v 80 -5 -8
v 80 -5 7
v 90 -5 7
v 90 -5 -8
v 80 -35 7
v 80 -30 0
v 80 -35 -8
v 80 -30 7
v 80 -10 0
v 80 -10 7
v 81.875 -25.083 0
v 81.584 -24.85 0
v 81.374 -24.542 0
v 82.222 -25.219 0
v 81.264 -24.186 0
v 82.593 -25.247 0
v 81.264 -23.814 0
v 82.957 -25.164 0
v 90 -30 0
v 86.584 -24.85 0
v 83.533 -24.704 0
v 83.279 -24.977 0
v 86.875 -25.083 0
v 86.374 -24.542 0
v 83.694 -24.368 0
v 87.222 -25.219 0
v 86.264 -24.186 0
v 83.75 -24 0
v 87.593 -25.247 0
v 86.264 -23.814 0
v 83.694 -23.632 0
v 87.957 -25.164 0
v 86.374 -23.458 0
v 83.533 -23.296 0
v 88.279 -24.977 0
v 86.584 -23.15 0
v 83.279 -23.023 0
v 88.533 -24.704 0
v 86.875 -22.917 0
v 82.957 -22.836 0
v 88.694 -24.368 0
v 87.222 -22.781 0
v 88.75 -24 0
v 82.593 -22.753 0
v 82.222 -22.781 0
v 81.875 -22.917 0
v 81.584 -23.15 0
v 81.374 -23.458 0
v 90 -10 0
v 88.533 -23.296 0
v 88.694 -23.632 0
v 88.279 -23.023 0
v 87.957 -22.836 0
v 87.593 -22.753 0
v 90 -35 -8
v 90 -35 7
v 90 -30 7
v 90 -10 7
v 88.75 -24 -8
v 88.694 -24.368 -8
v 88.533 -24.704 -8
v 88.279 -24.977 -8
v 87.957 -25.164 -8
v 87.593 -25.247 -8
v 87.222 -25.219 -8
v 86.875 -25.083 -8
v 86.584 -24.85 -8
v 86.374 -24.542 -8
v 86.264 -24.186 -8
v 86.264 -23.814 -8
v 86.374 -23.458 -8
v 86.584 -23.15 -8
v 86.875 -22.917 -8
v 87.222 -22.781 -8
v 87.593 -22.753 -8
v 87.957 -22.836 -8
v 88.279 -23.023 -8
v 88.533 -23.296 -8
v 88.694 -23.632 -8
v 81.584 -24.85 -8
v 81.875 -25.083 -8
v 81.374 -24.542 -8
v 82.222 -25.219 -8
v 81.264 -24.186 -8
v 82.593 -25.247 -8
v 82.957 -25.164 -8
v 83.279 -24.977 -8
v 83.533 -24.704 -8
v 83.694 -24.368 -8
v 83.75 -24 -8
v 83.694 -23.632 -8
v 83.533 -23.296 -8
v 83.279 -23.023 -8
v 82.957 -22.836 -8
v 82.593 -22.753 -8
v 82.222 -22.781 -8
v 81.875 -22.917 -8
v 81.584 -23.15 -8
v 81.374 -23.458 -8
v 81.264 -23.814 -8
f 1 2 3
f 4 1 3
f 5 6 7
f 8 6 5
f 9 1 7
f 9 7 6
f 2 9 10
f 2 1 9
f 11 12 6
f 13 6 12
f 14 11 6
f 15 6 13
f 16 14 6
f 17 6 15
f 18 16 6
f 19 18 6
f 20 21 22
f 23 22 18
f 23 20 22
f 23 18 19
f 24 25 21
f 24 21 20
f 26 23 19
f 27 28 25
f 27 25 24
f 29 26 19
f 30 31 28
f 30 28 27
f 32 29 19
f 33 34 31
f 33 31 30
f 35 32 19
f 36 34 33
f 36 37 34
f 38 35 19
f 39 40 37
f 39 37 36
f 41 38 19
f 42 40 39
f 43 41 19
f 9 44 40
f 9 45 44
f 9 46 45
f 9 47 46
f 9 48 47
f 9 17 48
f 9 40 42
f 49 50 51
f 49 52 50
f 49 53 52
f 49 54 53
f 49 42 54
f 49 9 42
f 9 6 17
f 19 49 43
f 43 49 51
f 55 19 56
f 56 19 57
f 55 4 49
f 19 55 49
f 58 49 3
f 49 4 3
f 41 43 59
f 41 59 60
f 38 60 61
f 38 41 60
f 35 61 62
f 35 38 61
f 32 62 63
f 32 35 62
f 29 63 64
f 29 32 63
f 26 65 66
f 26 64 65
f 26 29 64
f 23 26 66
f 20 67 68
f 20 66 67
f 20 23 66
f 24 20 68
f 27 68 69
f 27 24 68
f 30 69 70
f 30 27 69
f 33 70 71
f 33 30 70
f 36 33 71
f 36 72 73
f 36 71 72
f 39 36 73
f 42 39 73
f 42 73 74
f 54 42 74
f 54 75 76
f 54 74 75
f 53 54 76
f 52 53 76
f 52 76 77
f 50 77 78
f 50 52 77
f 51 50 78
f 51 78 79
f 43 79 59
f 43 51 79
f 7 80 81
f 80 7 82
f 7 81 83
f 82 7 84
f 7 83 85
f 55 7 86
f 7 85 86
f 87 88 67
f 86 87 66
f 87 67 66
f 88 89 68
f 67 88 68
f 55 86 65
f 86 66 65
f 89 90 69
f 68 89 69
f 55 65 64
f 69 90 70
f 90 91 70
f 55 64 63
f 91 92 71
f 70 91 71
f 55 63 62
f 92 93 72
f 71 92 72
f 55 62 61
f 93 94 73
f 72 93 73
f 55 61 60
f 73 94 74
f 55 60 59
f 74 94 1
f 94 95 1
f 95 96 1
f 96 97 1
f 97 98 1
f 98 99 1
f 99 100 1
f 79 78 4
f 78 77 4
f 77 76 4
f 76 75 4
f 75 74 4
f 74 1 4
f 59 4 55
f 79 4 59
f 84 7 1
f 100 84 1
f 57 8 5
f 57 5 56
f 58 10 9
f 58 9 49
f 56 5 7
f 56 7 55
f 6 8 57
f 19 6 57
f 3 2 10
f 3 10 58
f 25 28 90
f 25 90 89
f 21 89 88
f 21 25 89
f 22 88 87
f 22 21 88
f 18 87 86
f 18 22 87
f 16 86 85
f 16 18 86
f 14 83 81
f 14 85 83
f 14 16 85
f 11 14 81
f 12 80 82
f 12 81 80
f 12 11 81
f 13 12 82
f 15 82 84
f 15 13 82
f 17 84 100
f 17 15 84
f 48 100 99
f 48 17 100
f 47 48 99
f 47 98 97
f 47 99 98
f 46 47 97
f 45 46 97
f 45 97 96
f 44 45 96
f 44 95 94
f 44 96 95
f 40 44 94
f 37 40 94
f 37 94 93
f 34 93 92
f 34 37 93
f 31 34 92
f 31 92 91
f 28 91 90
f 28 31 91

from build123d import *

# Parameters (mm, degrees)
CYLINDER062_R          = 1.25
CYLINDER062_DEPTH      = 10
CYLINDER060_R          = 1.25
CYLINDER060_DEPTH      = 10
CYLINDER061_R          = 1.25
CYLINDER061_DEPTH      = 10
CYLINDER059_R          = 1.25
CYLINDER059_DEPTH      = 10
BOX025_W               = 10
BOX025_H               = 8
BOX025_DEPTH           = 20
BOX026_W               = 10
BOX026_H               = 15
BOX026_DEPTH           = 5
BOX024_W               = 10
BOX024_H               = 15
BOX024_DEPTH           = 5
CUT030_PLACEMENT_ANGLE = 90


with BuildPart() as cylinder062:
    # Cylinder062 → Cylinder062 (new body)
    with BuildSketch(Plane(origin=(87.5, 61, 14), x_dir=(1, 0, 0), z_dir=(0, -1, 0))):
        Circle(CYLINDER062_R)
    extrude(amount=CYLINDER062_DEPTH)


with BuildPart() as fusion060:
    # Cylinder060 → Cylinder060 (new body)
    with BuildSketch(Plane(origin=(87.5, 11, 14), x_dir=(1, 0, 0), z_dir=(0, -1, 0))):
        Circle(CYLINDER060_R)
    extrude(amount=CYLINDER060_DEPTH)

    # Fusion060: union Cylinder062
    add(cylinder062.part)


with BuildPart() as cylinder061:
    # Cylinder061 → Cylinder061 (new body)
    with BuildSketch(Plane(origin=(82.5, 61, 14), x_dir=(1, 0, 0), z_dir=(0, -1, 0))):
        Circle(CYLINDER061_R)
    extrude(amount=CYLINDER061_DEPTH)


with BuildPart() as fusion061:
    # Cylinder059 → Cylinder059 (new body)
    with BuildSketch(Plane(origin=(82.5, 11, 14), x_dir=(1, 0, 0), z_dir=(0, -1, 0))):
        Circle(CYLINDER059_R)
    extrude(amount=CYLINDER059_DEPTH)

    # Fusion062: union Cylinder061
    add(cylinder061.part)

    # Fusion061: union Fusion060
    add(fusion060.part)


with BuildPart() as fusion061_1:
    # Fusion061 placement: moved
    add(fusion061.part.moved(Location((0, -10, 0))))


with BuildPart() as cube004:
    # Box025 → Box025 (new body)
    with BuildSketch(Plane(origin=(0, -10, 0), x_dir=(1, 0, 0), z_dir=(0, 0, 1))):
        with Locations((5, 4)):
            Rectangle(BOX025_W, BOX025_H)
    extrude(amount=BOX025_DEPTH)


with BuildPart() as cube005:
    # Box026 → Box026 (new body)
    with BuildSketch(Plane(origin=(0, -10, 20), x_dir=(1, 0, 0), z_dir=(0, 0, 1))):
        with Locations((5, 7.5)):
            Rectangle(BOX026_W, BOX026_H)
    extrude(amount=BOX026_DEPTH)


with BuildPart() as cut030:
    # Box024 → Box024 (new body)
    with BuildSketch(Plane(origin=(0, -10, -5), x_dir=(1, 0, 0), z_dir=(0, 0, 1))):
        with Locations((5, 7.5)):
            Rectangle(BOX024_W, BOX024_H)
    extrude(amount=BOX024_DEPTH)

    # Fusion066: union Cube004, Cube005
    add(cube004.part)
    add(cube005.part)


with BuildPart() as cut030_1:
    # Fusion066 placement: moved
    add(cut030.part.moved(Location((80, 2, 0))))

    # Cut030: cut Fusion061
    add(fusion061_1.part, mode=Mode.SUBTRACT)


with BuildPart() as cut030_2:
    # Cut030 placement: moved
    add(cut030_1.part.moved(Location((0, -10, 0))).rotate(Axis((0, -10, 0), (1, 0, 0)), CUT030_PLACEMENT_ANGLE))


solid = cut030_2.part
